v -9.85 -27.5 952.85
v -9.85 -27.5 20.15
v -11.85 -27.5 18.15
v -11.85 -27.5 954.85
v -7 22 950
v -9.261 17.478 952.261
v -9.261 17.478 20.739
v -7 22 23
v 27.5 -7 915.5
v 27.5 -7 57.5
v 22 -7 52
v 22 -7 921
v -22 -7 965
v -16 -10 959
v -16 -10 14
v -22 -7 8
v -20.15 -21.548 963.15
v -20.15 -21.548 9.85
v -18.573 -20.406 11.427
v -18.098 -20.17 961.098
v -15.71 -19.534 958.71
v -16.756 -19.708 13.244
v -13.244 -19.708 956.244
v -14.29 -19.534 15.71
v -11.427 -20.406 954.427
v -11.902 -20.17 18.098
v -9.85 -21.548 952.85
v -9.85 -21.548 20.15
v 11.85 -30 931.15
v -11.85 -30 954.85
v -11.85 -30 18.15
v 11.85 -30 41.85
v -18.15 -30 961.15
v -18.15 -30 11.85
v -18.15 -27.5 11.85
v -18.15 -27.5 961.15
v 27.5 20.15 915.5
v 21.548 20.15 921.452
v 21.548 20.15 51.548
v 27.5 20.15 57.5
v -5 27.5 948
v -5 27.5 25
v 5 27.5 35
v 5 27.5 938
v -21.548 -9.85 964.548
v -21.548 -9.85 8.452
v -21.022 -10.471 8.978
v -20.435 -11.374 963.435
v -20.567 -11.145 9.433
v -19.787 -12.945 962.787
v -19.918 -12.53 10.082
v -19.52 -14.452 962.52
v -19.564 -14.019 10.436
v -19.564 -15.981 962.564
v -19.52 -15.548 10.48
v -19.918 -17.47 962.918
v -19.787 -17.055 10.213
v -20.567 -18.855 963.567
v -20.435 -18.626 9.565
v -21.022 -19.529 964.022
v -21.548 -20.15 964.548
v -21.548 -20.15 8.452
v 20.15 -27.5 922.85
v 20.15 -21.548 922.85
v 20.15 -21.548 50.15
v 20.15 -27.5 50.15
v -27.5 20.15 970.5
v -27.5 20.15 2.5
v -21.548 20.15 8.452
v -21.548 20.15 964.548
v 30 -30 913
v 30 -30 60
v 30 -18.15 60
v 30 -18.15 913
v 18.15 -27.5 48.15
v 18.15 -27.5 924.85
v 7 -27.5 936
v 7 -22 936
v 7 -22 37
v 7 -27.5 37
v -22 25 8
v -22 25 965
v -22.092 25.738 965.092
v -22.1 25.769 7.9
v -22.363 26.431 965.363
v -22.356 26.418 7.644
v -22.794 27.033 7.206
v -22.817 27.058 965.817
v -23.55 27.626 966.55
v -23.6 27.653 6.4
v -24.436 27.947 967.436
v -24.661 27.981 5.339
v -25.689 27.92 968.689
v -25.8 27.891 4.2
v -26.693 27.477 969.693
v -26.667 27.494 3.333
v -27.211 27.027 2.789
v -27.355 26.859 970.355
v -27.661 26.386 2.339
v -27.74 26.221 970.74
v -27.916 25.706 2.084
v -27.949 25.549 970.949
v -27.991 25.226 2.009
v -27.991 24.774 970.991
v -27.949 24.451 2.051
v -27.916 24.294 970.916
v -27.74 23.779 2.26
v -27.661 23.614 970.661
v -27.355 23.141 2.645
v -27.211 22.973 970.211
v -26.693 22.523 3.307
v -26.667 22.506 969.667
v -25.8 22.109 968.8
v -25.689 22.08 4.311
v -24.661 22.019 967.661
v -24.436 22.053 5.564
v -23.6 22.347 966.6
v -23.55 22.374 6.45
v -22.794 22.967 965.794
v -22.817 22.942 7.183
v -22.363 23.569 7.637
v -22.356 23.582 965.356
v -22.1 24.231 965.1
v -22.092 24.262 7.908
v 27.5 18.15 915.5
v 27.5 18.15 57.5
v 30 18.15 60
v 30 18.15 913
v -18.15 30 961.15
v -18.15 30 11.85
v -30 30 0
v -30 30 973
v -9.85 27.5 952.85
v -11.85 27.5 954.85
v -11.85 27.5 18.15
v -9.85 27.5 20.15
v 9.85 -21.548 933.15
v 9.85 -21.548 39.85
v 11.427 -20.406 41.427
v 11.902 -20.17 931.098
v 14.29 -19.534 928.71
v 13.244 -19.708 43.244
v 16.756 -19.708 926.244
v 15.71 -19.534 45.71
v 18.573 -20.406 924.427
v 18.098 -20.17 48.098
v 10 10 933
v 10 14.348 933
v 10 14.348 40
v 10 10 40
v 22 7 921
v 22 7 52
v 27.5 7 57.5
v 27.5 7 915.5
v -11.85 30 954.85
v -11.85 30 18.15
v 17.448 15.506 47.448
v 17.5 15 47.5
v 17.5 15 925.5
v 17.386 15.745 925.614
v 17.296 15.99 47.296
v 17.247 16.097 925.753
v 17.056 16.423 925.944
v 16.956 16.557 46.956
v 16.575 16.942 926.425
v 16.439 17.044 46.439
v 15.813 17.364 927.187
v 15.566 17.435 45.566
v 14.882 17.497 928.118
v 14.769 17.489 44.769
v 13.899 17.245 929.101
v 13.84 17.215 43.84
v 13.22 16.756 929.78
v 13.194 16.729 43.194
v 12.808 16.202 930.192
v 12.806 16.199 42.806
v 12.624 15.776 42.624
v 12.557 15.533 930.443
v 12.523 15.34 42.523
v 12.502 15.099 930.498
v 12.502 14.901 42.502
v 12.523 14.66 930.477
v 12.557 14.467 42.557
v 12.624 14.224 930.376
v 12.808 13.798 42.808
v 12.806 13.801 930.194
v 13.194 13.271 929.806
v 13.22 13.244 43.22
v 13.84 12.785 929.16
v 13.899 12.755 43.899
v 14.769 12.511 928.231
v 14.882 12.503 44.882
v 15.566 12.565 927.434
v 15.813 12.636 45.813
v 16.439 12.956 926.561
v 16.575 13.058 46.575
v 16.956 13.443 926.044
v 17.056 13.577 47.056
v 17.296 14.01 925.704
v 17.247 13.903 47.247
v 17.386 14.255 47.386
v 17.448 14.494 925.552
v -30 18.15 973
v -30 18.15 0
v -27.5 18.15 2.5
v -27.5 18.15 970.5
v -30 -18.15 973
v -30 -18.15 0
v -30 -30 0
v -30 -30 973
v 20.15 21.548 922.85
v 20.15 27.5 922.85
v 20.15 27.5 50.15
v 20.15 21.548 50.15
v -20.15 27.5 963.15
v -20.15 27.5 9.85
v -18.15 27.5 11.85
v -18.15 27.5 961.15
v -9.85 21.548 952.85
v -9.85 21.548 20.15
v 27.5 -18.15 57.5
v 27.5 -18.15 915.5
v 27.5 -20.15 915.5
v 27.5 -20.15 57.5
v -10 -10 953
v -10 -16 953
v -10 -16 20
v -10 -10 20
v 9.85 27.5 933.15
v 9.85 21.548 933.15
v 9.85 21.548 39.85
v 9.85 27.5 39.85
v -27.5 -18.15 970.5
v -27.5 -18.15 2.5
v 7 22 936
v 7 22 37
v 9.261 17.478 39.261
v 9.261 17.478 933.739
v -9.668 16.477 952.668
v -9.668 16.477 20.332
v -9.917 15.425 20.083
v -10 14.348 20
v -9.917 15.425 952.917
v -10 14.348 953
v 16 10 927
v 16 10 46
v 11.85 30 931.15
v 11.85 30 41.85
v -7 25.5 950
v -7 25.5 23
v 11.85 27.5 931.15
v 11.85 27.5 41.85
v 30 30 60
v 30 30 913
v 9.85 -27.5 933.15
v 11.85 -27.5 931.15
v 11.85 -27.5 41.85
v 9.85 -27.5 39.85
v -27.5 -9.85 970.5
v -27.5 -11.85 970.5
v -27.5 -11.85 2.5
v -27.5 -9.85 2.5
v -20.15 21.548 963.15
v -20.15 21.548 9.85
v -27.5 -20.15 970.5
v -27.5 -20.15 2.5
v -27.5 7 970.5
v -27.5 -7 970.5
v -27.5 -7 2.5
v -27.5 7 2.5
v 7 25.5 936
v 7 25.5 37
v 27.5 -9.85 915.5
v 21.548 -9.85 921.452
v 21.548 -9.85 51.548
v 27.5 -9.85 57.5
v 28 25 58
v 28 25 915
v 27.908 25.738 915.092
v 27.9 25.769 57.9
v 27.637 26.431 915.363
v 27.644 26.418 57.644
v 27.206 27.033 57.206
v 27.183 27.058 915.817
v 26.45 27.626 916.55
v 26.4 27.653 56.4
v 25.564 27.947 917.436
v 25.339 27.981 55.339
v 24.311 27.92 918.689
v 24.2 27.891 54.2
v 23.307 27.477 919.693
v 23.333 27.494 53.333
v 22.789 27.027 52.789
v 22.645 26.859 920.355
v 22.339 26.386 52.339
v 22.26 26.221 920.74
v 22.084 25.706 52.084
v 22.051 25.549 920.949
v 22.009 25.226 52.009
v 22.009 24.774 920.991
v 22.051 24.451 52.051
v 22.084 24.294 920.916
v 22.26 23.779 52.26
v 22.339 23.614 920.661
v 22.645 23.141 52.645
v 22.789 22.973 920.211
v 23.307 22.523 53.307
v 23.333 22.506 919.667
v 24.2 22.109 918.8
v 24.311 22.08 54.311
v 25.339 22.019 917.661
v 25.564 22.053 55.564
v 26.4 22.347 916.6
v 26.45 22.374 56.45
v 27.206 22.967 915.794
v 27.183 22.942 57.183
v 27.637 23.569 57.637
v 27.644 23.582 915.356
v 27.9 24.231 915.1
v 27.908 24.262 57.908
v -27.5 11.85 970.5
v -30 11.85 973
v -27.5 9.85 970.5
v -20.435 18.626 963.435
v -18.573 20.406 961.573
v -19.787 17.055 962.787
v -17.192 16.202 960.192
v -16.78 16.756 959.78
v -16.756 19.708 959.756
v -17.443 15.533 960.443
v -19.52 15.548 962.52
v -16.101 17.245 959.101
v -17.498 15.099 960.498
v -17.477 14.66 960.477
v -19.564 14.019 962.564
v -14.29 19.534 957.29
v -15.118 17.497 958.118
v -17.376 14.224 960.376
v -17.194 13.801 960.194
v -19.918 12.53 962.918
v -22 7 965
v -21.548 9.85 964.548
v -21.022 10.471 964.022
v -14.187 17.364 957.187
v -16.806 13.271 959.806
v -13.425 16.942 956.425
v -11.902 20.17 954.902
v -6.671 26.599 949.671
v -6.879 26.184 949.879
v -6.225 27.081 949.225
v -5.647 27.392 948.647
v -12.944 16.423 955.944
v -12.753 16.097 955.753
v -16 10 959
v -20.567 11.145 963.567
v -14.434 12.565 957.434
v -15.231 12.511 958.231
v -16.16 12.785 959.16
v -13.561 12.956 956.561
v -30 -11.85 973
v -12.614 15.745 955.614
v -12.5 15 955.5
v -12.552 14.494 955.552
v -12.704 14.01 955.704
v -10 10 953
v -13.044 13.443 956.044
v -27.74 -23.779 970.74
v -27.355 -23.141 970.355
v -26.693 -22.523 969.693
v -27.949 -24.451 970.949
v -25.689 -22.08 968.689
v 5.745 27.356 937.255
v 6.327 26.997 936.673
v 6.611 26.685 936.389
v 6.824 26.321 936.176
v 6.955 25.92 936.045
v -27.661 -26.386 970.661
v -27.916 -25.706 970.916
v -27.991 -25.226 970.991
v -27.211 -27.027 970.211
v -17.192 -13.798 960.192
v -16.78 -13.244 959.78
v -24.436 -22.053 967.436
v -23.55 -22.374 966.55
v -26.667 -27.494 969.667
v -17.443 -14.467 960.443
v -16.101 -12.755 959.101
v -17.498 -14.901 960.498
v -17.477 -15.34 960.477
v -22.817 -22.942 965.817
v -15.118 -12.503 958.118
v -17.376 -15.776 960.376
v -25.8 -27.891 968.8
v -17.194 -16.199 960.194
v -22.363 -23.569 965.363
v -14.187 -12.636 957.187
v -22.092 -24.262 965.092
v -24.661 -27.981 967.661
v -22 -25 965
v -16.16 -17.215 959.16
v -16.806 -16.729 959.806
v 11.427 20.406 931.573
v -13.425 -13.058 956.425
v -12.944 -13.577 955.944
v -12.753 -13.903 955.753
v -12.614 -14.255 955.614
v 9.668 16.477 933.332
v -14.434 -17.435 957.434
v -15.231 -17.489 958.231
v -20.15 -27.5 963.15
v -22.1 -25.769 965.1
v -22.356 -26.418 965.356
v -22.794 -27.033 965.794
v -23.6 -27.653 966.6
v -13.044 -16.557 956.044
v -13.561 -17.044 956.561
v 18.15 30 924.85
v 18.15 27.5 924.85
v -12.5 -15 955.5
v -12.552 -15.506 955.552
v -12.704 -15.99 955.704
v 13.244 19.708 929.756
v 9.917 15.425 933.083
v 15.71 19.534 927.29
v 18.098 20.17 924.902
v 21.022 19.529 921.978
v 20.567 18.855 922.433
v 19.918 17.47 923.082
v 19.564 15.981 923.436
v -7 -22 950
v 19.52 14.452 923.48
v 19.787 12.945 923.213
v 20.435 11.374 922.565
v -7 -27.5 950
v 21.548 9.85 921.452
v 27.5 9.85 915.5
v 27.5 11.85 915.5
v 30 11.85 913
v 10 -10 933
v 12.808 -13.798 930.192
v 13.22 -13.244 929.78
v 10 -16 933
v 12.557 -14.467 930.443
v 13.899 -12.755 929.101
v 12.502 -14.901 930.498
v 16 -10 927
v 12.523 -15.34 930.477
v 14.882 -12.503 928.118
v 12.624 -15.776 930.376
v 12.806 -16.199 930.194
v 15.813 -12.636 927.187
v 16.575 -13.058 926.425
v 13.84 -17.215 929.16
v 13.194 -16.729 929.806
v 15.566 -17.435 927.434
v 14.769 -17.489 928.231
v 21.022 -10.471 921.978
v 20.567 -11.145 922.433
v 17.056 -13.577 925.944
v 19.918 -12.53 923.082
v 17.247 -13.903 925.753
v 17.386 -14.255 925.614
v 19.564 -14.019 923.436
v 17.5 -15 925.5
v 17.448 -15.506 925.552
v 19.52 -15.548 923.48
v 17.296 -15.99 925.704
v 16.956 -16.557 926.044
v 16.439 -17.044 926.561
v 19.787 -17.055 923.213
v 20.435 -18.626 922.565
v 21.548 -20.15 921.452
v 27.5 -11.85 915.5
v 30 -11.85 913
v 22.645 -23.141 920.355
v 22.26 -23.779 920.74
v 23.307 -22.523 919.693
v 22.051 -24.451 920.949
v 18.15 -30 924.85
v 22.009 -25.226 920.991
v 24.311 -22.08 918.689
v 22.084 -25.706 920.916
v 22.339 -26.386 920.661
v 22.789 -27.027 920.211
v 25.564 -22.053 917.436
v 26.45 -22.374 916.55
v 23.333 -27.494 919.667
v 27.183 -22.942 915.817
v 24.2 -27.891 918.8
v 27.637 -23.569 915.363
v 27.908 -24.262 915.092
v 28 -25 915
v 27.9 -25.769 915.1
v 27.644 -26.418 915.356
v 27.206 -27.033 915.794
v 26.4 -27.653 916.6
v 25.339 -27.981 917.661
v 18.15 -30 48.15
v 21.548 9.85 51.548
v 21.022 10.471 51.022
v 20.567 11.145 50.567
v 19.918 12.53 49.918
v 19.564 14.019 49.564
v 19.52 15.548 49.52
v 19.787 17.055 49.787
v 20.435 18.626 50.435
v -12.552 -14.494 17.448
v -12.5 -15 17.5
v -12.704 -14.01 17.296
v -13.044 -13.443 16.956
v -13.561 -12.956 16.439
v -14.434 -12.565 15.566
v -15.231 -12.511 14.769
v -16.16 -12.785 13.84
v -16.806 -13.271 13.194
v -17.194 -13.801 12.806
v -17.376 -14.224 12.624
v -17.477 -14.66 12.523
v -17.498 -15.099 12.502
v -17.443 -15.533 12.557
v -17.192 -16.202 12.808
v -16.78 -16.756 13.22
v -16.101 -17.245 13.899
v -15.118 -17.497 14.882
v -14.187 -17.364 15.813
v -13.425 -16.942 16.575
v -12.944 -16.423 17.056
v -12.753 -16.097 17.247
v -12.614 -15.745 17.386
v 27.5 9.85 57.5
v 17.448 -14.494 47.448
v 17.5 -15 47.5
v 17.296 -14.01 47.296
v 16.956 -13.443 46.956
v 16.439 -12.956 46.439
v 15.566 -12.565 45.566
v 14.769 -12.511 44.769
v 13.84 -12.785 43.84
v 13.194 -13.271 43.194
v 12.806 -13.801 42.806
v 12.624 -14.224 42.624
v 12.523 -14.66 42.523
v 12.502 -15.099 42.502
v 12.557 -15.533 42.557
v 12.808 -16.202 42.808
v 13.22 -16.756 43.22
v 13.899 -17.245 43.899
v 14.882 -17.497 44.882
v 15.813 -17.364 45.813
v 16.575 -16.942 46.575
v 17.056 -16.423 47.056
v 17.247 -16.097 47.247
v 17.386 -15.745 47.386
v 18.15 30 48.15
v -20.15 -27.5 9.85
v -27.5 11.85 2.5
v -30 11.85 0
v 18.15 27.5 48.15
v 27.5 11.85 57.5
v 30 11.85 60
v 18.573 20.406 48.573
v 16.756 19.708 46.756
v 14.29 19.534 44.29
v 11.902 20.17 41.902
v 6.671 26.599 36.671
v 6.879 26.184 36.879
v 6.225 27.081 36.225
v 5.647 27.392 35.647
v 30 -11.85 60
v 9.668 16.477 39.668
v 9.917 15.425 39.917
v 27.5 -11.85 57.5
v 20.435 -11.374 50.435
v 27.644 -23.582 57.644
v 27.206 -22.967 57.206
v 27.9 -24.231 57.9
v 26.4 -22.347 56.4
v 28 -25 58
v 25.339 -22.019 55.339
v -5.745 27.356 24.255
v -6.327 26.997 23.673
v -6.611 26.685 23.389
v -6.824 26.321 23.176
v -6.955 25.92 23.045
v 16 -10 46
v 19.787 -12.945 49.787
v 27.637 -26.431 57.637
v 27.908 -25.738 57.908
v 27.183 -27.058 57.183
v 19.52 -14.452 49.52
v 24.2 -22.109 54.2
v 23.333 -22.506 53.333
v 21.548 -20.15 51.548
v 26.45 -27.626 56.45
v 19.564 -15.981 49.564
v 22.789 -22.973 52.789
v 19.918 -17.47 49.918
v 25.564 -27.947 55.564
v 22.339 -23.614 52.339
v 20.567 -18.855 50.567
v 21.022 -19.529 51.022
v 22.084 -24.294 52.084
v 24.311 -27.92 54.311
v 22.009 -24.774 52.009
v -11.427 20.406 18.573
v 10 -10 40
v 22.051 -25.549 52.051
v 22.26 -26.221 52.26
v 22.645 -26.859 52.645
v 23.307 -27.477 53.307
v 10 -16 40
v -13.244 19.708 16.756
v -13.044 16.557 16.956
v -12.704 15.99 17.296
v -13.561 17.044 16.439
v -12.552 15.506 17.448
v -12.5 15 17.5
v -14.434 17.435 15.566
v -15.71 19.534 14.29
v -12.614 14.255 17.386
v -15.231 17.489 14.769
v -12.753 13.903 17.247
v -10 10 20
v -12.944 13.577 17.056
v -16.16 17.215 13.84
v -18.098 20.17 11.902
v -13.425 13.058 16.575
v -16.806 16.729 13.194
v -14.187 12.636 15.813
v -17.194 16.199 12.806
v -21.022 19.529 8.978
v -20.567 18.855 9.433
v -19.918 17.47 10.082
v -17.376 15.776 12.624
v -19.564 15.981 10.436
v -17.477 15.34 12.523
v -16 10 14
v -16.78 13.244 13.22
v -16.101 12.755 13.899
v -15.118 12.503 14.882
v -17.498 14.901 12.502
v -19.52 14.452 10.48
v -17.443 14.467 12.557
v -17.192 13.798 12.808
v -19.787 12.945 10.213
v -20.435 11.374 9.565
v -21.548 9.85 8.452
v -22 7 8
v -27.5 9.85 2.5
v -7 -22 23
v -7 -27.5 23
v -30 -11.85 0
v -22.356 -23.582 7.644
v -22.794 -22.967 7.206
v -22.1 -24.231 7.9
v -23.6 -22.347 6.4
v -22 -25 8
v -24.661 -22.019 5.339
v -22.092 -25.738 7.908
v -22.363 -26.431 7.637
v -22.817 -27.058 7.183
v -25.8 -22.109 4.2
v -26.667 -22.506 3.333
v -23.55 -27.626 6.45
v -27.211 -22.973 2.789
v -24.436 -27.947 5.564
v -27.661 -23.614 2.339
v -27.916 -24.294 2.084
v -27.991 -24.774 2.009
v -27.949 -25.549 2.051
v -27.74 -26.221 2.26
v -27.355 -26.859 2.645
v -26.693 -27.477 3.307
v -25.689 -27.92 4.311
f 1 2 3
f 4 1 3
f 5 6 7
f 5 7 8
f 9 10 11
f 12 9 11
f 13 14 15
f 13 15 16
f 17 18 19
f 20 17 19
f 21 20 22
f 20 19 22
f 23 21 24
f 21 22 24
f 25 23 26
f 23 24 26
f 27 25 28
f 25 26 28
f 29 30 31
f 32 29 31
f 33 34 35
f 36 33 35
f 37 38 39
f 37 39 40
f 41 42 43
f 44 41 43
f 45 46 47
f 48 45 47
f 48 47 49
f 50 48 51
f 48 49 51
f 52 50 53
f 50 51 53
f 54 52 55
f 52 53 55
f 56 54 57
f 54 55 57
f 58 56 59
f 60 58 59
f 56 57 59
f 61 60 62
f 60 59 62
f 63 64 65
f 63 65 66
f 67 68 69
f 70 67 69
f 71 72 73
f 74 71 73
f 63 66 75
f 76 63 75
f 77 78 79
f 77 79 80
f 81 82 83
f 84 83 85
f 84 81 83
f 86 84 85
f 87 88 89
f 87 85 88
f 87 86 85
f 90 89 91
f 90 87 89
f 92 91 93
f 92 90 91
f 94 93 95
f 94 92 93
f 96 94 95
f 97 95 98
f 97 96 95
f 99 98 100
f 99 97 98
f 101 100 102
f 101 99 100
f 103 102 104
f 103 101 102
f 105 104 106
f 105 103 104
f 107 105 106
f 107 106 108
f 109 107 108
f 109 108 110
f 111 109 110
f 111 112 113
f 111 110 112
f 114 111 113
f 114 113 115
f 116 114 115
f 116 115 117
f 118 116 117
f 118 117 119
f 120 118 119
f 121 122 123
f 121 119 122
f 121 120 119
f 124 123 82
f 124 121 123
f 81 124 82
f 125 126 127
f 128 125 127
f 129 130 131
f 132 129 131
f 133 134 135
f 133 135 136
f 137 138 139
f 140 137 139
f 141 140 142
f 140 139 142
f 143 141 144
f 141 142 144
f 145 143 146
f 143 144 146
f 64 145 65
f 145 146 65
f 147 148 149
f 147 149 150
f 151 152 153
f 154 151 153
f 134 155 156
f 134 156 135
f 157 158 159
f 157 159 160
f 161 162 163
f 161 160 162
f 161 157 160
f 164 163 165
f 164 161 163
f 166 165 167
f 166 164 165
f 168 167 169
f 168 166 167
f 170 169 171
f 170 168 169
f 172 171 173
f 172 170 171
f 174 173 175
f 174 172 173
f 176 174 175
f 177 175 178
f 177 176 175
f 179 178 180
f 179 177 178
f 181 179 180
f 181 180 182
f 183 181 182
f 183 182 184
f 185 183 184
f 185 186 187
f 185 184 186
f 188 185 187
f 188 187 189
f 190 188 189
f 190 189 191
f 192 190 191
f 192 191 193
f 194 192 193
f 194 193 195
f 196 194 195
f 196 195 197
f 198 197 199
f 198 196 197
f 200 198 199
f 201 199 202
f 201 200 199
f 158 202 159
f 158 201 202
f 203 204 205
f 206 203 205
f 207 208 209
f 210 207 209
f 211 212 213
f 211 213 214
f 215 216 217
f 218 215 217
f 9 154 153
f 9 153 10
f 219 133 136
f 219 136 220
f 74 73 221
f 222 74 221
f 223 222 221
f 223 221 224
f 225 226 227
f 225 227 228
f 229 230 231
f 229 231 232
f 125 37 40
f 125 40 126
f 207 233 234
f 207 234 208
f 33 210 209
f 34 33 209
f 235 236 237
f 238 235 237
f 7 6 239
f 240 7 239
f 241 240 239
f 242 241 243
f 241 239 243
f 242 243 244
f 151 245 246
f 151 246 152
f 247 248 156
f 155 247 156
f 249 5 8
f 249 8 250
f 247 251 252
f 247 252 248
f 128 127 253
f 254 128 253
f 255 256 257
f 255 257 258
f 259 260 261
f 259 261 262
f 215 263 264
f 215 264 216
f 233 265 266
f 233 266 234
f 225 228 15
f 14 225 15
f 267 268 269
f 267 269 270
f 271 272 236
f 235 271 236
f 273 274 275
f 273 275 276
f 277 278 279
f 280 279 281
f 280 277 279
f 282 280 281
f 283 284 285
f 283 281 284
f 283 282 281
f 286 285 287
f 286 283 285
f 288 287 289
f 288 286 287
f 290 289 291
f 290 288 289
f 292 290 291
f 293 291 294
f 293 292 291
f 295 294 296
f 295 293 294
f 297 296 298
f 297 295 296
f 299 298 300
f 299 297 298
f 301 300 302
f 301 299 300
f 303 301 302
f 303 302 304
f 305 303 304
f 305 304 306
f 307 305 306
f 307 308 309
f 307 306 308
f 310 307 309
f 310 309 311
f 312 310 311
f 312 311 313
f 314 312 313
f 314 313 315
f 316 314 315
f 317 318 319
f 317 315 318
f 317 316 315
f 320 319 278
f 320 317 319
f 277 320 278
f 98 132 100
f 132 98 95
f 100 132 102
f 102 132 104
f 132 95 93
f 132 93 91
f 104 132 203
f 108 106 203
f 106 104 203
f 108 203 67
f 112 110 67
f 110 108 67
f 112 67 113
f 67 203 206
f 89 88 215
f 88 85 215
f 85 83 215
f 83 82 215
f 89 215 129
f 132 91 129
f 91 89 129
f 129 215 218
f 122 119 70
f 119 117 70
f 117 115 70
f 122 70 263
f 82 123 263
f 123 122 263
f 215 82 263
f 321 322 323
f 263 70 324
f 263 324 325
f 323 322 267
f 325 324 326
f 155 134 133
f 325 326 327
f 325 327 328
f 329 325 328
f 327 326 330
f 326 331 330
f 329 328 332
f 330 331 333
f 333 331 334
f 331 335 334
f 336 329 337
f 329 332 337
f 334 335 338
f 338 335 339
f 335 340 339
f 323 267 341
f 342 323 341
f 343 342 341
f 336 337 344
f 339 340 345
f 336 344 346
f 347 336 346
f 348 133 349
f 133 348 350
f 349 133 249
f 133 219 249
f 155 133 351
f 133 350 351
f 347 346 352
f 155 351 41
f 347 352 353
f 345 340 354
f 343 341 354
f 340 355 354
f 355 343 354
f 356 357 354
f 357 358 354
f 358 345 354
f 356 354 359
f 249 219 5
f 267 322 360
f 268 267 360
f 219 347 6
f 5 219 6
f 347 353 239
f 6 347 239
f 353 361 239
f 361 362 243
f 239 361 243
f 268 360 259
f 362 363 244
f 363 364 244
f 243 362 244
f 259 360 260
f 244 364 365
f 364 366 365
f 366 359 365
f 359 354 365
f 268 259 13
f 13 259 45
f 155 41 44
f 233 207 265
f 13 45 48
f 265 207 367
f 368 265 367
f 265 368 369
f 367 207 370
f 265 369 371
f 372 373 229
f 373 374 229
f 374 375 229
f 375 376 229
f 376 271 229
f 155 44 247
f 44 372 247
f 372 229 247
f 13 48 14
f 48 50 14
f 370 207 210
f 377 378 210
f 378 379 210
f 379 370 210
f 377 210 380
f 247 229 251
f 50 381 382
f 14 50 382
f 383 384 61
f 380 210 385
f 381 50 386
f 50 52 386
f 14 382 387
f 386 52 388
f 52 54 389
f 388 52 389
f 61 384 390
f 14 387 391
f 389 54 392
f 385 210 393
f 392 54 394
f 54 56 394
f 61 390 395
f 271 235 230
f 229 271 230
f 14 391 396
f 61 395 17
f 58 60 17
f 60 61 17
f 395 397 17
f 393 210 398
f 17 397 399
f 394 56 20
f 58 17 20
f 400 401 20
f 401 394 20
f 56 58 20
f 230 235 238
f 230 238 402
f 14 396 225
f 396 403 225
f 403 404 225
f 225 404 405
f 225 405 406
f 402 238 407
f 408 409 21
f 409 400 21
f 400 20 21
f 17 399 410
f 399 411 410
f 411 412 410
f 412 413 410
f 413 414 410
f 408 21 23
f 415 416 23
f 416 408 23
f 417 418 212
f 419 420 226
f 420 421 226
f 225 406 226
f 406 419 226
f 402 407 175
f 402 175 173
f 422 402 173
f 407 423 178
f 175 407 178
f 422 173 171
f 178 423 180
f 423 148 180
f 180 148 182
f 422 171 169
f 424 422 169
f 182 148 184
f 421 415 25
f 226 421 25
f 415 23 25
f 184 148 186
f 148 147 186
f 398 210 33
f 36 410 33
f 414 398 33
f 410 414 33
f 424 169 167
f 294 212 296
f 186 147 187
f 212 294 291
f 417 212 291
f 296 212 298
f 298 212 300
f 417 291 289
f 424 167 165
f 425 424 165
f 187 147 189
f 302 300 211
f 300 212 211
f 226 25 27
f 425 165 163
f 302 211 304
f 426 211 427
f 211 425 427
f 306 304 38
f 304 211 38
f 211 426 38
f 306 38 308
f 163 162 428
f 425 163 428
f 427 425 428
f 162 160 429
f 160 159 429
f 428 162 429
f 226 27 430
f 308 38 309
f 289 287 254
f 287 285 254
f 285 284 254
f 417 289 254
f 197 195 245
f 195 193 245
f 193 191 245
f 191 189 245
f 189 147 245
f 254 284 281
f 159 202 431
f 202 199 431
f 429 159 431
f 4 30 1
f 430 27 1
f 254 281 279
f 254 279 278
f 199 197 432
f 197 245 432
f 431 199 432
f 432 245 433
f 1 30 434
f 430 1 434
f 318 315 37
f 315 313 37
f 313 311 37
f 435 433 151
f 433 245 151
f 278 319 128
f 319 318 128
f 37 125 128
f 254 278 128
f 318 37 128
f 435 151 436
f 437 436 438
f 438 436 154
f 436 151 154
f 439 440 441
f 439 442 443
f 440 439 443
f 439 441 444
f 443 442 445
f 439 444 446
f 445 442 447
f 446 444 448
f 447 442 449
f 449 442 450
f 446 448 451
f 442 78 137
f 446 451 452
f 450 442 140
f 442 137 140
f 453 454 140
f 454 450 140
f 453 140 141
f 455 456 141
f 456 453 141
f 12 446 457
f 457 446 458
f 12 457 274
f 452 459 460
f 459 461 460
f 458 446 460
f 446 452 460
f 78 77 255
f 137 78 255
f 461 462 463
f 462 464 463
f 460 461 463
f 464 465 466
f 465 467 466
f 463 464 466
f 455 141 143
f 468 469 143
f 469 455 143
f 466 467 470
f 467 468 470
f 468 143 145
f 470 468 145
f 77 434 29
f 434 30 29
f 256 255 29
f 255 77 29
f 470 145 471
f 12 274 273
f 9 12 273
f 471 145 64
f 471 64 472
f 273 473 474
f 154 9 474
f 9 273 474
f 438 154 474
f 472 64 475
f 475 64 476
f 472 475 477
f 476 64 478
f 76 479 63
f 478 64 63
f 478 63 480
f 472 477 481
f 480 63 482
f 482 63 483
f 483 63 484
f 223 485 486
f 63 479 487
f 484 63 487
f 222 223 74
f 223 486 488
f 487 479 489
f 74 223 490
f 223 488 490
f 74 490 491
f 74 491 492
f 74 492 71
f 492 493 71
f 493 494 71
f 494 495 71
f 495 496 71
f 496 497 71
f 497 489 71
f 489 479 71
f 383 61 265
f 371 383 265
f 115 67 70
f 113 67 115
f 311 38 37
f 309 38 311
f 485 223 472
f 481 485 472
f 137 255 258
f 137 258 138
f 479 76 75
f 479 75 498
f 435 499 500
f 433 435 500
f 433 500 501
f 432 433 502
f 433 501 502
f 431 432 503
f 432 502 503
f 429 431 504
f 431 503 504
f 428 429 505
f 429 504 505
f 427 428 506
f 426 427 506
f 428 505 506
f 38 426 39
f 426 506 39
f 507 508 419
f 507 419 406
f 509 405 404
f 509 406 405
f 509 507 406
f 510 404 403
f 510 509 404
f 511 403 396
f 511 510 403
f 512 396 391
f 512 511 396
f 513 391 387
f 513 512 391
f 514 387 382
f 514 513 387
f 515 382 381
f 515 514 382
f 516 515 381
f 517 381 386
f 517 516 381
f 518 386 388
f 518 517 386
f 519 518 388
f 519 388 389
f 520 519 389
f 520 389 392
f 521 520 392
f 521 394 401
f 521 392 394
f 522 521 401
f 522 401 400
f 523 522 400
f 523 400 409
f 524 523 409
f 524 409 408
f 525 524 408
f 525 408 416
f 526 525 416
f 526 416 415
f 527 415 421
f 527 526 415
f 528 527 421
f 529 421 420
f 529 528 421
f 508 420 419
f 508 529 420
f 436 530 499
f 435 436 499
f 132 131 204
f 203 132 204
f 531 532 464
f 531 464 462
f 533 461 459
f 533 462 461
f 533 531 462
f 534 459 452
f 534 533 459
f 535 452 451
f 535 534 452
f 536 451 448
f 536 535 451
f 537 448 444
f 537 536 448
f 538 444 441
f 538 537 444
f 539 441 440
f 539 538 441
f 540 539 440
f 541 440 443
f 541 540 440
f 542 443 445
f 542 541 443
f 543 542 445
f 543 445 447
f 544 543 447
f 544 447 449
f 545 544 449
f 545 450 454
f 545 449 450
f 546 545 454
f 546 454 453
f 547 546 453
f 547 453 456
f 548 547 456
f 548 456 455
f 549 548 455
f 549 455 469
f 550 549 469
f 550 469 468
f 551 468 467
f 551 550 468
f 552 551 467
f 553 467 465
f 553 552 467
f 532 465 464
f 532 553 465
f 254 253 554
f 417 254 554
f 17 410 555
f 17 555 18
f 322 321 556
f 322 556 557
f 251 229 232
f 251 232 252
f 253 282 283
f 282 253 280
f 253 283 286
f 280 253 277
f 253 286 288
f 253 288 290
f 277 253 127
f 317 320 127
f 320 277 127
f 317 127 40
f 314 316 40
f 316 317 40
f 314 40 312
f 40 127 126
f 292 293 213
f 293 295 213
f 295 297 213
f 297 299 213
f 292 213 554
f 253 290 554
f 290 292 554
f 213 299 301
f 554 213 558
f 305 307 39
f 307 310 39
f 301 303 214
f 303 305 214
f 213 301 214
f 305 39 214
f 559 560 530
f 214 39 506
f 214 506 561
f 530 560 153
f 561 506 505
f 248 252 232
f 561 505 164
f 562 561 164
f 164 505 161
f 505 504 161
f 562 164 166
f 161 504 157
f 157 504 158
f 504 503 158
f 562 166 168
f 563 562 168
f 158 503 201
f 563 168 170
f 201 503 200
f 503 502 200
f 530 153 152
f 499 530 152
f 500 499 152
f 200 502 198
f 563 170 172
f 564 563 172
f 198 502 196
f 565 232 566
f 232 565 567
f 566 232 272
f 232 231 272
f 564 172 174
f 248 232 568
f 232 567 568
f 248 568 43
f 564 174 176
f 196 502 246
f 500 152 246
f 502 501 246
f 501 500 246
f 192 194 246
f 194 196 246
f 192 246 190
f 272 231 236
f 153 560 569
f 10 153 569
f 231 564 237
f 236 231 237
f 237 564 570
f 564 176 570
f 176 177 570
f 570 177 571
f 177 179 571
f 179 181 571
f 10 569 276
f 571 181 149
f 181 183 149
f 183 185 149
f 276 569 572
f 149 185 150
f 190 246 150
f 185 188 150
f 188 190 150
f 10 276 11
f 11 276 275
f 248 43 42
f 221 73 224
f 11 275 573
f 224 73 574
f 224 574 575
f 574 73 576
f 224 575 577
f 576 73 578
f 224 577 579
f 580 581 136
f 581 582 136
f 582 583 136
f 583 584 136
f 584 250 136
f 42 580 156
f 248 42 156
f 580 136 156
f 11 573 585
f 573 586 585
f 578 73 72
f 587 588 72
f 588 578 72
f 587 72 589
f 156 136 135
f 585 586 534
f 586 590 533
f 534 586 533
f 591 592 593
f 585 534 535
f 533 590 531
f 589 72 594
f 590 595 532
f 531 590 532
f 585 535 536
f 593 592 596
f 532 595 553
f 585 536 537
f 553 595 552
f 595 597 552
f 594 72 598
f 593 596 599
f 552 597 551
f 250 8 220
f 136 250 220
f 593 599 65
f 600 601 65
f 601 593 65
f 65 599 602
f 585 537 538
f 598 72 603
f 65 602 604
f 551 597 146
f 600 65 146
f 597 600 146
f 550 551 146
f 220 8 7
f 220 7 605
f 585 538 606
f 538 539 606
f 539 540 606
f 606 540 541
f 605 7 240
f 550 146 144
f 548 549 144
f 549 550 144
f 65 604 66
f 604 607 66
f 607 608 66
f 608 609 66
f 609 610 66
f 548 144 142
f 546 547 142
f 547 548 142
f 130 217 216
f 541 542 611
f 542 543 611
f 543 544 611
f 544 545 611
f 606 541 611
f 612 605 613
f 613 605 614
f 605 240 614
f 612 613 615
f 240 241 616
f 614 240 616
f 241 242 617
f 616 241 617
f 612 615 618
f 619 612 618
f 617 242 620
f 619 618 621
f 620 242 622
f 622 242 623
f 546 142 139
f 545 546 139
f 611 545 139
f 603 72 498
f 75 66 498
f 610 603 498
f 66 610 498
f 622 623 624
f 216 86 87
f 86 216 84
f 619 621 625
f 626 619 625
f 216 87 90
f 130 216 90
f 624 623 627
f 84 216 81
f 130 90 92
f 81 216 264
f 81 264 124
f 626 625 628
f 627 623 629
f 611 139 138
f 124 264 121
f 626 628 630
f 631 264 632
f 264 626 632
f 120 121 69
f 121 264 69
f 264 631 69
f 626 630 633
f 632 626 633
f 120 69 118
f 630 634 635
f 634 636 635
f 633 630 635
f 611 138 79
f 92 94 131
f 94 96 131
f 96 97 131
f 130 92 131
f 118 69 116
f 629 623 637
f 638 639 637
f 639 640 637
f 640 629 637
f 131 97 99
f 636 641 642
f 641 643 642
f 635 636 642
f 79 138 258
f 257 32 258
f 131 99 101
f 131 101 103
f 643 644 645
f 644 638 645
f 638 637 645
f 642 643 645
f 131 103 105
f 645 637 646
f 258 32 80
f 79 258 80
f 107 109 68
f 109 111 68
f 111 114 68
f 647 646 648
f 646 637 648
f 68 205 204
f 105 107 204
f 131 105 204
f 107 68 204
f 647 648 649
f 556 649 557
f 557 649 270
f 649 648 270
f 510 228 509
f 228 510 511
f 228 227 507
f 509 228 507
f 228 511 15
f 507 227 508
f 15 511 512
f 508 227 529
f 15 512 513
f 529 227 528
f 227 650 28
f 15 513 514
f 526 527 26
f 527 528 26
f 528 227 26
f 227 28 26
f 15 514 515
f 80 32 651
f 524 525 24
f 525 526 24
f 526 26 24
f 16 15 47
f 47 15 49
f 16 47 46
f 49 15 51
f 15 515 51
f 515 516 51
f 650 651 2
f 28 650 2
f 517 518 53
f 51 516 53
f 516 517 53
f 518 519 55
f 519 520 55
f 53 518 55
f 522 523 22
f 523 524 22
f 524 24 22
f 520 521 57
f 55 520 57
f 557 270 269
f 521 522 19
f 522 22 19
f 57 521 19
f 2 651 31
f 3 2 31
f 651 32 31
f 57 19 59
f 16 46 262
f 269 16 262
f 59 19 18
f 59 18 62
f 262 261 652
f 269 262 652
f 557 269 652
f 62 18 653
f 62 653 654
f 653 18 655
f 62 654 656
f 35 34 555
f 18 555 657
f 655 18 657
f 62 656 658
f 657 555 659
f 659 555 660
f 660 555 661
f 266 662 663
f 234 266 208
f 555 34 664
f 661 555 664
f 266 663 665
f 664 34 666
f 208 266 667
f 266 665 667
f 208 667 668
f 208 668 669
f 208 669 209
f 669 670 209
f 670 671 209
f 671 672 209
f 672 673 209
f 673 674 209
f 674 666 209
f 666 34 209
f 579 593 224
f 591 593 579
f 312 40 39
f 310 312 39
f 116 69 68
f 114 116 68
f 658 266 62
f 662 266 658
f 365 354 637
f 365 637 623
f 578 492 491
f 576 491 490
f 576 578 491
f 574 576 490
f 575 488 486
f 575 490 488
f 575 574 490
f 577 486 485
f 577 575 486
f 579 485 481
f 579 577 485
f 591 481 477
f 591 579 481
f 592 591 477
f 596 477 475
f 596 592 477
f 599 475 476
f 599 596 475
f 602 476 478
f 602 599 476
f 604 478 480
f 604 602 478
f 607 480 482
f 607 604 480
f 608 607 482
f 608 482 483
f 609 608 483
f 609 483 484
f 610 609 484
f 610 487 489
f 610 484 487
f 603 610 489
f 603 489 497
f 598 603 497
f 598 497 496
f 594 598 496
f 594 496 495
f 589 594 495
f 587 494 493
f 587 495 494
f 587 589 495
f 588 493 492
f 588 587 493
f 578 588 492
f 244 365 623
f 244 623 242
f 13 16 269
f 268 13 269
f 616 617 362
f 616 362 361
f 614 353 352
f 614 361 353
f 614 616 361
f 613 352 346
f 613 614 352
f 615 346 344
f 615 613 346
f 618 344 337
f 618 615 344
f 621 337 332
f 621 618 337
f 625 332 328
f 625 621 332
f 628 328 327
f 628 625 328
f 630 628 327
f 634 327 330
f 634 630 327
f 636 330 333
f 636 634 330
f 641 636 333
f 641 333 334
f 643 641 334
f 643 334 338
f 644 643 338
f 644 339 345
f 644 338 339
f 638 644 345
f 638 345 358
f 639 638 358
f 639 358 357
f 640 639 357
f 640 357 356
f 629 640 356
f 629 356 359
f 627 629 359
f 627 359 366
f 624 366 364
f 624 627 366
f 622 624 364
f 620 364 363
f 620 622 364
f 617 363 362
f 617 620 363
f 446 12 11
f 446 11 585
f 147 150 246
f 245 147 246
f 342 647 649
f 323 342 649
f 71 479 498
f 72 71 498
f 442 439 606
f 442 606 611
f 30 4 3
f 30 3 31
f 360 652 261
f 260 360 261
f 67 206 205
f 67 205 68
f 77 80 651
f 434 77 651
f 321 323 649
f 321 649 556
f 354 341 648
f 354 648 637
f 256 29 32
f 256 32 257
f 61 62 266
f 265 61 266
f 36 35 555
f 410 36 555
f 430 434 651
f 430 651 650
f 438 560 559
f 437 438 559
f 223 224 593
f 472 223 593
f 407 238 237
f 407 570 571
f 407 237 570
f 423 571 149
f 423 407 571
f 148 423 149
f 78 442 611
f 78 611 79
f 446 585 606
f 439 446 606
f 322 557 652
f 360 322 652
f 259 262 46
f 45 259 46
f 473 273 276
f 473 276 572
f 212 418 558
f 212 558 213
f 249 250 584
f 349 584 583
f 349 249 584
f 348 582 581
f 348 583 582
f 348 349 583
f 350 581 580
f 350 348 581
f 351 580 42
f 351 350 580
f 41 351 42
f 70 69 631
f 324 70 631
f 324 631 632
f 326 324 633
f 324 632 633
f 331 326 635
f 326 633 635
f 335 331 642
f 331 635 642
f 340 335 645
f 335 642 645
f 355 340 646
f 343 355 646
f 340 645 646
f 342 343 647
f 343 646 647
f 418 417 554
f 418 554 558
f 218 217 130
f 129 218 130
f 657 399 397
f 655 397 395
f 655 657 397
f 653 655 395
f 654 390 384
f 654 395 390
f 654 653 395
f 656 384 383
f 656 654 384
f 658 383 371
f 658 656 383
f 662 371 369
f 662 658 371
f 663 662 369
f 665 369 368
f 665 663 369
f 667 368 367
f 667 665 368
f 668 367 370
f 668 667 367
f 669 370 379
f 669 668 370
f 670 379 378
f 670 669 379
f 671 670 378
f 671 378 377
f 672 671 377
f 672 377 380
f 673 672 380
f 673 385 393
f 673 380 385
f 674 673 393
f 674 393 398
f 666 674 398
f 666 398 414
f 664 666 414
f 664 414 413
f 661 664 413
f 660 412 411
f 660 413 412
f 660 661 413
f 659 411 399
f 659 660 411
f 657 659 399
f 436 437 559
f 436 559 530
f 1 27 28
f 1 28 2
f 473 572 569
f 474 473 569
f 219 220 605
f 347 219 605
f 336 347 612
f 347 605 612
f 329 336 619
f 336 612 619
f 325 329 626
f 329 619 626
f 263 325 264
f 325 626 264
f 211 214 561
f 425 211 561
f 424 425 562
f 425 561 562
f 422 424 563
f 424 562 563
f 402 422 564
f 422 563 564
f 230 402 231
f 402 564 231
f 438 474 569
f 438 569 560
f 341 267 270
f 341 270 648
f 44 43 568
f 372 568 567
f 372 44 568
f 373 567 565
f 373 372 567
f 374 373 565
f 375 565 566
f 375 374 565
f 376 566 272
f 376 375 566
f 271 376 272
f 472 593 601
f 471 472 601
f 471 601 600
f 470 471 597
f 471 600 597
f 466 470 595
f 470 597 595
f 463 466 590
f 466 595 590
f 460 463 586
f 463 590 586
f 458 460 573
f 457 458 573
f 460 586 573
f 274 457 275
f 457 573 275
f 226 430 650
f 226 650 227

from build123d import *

# Parameters (mm, degrees)
F0_R     = 3
F0_R_2   = 2.5
F1_DEPTH = 973
F2_R     = 2
F3_R     = 7
F5_DEPTH = 60


# Not quite as in the source:
# - a feature names something its author has since deleted; it is built from what else it names


with BuildPart() as f1:
    # F0 (on Top) → F1 (new body)
    with BuildSketch(Plane.XY):
        with BuildLine():
            Line((18.15, -30), (30, -30))
            Line((30, -30), (30, -18.15))
            Line((30, -18.15), (27.5, -18.15))
            Line((27.5, -18.15), (27.5, -20.15))
            Line((27.5, -20.15), (21.5477069044, -20.15))
            ThreePointArc((21.5477069044, -20.15), (19.5, -15), (21.5477069044, -9.85))
            Line((21.5477069044, -9.85), (27.5, -9.85))
            Line((27.5, -9.85), (27.5, -11.85))
            Line((27.5, -11.85), (30, -11.85))
            Line((30, -11.85), (30, 11.85))
            Line((30, 11.85), (27.5, 11.85))
            Line((27.5, 11.85), (27.5, 9.85))
            Line((27.5, 9.85), (21.5477069044, 9.85))
            ThreePointArc((21.5477069044, 9.85), (19.5, 15), (21.5477069044, 20.15))
            Line((21.5477069044, 20.15), (27.5, 20.15))
            Line((27.5, 20.15), (27.5, 18.15))
            Line((27.5, 18.15), (30, 18.15))
            Line((30, 18.15), (30, 30))
            Line((30, 30), (18.15, 30))
            Line((18.15, 30), (18.15, 27.5))
            Line((18.15, 27.5), (20.15, 27.5))
            Line((20.15, 27.5), (20.15, 21.5477069044))
            ThreePointArc((20.15, 21.5477069044), (15, 19.5), (9.85, 21.5477069044))
            Line((9.85, 21.5477069044), (9.85, 27.5))
            Line((9.85, 27.5), (11.85, 27.5))
            Line((11.85, 27.5), (11.85, 30))
            Line((11.85, 30), (-11.85, 30))
            Line((-11.85, 30), (-11.85, 27.5))
            Line((-11.85, 27.5), (-9.85, 27.5))
            Line((-9.85, 27.5), (-9.85, 21.5477069044))
            ThreePointArc((-9.85, 21.5477069044), (-15, 19.5), (-20.15, 21.5477069044))
            Line((-20.15, 21.5477069044), (-20.15, 27.5))
            Line((-20.15, 27.5), (-18.15, 27.5))
            Line((-18.15, 27.5), (-18.15, 30))
            Line((-18.15, 30), (-30, 30))
            Line((-30, 30), (-30, 18.15))
            Line((-30, 18.15), (-27.5, 18.15))
            Line((-27.5, 18.15), (-27.5, 20.15))
            Line((-27.5, 20.15), (-21.5477069044, 20.15))
            ThreePointArc((-21.5477069044, 20.15), (-19.5, 15), (-21.5477069044, 9.85))
            Line((-21.5477069044, 9.85), (-27.5, 9.85))
            Line((-27.5, 9.85), (-27.5, 11.85))
            Line((-27.5, 11.85), (-30, 11.85))
            Line((-30, 11.85), (-30, -11.85))
            Line((-30, -11.85), (-27.5, -11.85))
            Line((-27.5, -11.85), (-27.5, -9.85))
            Line((-27.5, -9.85), (-21.5477069044, -9.85))
            ThreePointArc((-21.5477069044, -9.85), (-19.5, -15), (-21.5477069044, -20.15))
            Line((-21.5477069044, -20.15), (-27.5, -20.15))
            Line((-27.5, -20.15), (-27.5, -18.15))
            Line((-27.5, -18.15), (-30, -18.15))
            Line((-30, -18.15), (-30, -30))
            Line((-30, -30), (-18.15, -30))
            Line((-18.15, -30), (-18.15, -27.5))
            Line((-18.15, -27.5), (-20.15, -27.5))
            Line((-20.15, -27.5), (-20.15, -21.5477069044))
            ThreePointArc((-20.15, -21.5477069044), (-15, -19.5), (-9.85, -21.5477069044))
            Line((-9.85, -21.5477069044), (-9.85, -27.5))
            Line((-9.85, -27.5), (-11.85, -27.5))
            Line((-11.85, -27.5), (-11.85, -30))
            Line((-11.85, -30), (11.85, -30))
            Line((11.85, -30), (11.85, -27.5))
            Line((11.85, -27.5), (9.85, -27.5))
            Line((9.85, -27.5), (9.85, -21.5477069044))
            ThreePointArc((9.85, -21.5477069044), (15, -19.5), (20.15, -21.5477069044))
            Line((20.15, -21.5477069044), (20.15, -27.5))
            Line((20.15, -27.5), (18.15, -27.5))
            Line((18.15, -27.5), (18.15, -30))
        make_face()
        with Locations((-25, -25)):
            Circle(F0_R, mode=Mode.SUBTRACT)
        with Locations((-15, -15)):
            Circle(F0_R_2, mode=Mode.SUBTRACT)
        with Locations((25, -25)):
            Circle(F0_R, mode=Mode.SUBTRACT)
        with Locations((15, -15)):
            Circle(F0_R_2, mode=Mode.SUBTRACT)
        with Locations((-25, 25)):
            Circle(F0_R, mode=Mode.SUBTRACT)
        with Locations((-15, 15)):
            Circle(F0_R_2, mode=Mode.SUBTRACT)
        Polygon((-7, 22), (-7, 27.5), (0, 27.5), (7, 27.5), (7, 22), (10, 16), (10, 10), (16, 10), (22, 7), (27.5, 7), (27.5, 0), (27.5, -7), (22, -7), (16, -10), (10, -10), (10, -16), (7, -22), (7, -27.5), (0, -27.5), (-7, -27.5), (-7, -22), (-10, -16), (-10, -10), (-16, -10), (-22, -7), (-27.5, -7), (-27.5, 0), (-27.5, 7), (-22, 7), (-16, 10), (-10, 10), (-10, 16), align=None, mode=Mode.SUBTRACT)
        with Locations((15, 15)):
            Circle(F0_R_2, mode=Mode.SUBTRACT)
        with Locations((25, 25)):
            Circle(F0_R, mode=Mode.SUBTRACT)
    extrude(amount=F1_DEPTH)

    # F2
    f2_edges = [f1.edges().sort_by_distance(p)[0] for p in [
        (-7, 27.5, 486.5),
        (7, 27.5, 486.5),
    ]]
    fillet(f2_edges, radius=F2_R)

    # F3
    f3_edges = [f1.edges().sort_by_distance(p)[0] for p in [
        (-10, 16, 486.5),
        (10, 16, 486.5),
    ]]
    fillet(f3_edges, radius=F3_R)

    # F4 (on face) → F5 (cut)
    with BuildSketch(Plane.XZ.offset(30)):
        Polygon((30, 0), (30, 60), (-30, 0), (-18.15, 0), align=None)
        Polygon((30, 913), (30, 973), (-18.15, 973), (-30, 973), align=None)
    extrude(amount=-F5_DEPTH, mode=Mode.SUBTRACT)


solid = f1.part
